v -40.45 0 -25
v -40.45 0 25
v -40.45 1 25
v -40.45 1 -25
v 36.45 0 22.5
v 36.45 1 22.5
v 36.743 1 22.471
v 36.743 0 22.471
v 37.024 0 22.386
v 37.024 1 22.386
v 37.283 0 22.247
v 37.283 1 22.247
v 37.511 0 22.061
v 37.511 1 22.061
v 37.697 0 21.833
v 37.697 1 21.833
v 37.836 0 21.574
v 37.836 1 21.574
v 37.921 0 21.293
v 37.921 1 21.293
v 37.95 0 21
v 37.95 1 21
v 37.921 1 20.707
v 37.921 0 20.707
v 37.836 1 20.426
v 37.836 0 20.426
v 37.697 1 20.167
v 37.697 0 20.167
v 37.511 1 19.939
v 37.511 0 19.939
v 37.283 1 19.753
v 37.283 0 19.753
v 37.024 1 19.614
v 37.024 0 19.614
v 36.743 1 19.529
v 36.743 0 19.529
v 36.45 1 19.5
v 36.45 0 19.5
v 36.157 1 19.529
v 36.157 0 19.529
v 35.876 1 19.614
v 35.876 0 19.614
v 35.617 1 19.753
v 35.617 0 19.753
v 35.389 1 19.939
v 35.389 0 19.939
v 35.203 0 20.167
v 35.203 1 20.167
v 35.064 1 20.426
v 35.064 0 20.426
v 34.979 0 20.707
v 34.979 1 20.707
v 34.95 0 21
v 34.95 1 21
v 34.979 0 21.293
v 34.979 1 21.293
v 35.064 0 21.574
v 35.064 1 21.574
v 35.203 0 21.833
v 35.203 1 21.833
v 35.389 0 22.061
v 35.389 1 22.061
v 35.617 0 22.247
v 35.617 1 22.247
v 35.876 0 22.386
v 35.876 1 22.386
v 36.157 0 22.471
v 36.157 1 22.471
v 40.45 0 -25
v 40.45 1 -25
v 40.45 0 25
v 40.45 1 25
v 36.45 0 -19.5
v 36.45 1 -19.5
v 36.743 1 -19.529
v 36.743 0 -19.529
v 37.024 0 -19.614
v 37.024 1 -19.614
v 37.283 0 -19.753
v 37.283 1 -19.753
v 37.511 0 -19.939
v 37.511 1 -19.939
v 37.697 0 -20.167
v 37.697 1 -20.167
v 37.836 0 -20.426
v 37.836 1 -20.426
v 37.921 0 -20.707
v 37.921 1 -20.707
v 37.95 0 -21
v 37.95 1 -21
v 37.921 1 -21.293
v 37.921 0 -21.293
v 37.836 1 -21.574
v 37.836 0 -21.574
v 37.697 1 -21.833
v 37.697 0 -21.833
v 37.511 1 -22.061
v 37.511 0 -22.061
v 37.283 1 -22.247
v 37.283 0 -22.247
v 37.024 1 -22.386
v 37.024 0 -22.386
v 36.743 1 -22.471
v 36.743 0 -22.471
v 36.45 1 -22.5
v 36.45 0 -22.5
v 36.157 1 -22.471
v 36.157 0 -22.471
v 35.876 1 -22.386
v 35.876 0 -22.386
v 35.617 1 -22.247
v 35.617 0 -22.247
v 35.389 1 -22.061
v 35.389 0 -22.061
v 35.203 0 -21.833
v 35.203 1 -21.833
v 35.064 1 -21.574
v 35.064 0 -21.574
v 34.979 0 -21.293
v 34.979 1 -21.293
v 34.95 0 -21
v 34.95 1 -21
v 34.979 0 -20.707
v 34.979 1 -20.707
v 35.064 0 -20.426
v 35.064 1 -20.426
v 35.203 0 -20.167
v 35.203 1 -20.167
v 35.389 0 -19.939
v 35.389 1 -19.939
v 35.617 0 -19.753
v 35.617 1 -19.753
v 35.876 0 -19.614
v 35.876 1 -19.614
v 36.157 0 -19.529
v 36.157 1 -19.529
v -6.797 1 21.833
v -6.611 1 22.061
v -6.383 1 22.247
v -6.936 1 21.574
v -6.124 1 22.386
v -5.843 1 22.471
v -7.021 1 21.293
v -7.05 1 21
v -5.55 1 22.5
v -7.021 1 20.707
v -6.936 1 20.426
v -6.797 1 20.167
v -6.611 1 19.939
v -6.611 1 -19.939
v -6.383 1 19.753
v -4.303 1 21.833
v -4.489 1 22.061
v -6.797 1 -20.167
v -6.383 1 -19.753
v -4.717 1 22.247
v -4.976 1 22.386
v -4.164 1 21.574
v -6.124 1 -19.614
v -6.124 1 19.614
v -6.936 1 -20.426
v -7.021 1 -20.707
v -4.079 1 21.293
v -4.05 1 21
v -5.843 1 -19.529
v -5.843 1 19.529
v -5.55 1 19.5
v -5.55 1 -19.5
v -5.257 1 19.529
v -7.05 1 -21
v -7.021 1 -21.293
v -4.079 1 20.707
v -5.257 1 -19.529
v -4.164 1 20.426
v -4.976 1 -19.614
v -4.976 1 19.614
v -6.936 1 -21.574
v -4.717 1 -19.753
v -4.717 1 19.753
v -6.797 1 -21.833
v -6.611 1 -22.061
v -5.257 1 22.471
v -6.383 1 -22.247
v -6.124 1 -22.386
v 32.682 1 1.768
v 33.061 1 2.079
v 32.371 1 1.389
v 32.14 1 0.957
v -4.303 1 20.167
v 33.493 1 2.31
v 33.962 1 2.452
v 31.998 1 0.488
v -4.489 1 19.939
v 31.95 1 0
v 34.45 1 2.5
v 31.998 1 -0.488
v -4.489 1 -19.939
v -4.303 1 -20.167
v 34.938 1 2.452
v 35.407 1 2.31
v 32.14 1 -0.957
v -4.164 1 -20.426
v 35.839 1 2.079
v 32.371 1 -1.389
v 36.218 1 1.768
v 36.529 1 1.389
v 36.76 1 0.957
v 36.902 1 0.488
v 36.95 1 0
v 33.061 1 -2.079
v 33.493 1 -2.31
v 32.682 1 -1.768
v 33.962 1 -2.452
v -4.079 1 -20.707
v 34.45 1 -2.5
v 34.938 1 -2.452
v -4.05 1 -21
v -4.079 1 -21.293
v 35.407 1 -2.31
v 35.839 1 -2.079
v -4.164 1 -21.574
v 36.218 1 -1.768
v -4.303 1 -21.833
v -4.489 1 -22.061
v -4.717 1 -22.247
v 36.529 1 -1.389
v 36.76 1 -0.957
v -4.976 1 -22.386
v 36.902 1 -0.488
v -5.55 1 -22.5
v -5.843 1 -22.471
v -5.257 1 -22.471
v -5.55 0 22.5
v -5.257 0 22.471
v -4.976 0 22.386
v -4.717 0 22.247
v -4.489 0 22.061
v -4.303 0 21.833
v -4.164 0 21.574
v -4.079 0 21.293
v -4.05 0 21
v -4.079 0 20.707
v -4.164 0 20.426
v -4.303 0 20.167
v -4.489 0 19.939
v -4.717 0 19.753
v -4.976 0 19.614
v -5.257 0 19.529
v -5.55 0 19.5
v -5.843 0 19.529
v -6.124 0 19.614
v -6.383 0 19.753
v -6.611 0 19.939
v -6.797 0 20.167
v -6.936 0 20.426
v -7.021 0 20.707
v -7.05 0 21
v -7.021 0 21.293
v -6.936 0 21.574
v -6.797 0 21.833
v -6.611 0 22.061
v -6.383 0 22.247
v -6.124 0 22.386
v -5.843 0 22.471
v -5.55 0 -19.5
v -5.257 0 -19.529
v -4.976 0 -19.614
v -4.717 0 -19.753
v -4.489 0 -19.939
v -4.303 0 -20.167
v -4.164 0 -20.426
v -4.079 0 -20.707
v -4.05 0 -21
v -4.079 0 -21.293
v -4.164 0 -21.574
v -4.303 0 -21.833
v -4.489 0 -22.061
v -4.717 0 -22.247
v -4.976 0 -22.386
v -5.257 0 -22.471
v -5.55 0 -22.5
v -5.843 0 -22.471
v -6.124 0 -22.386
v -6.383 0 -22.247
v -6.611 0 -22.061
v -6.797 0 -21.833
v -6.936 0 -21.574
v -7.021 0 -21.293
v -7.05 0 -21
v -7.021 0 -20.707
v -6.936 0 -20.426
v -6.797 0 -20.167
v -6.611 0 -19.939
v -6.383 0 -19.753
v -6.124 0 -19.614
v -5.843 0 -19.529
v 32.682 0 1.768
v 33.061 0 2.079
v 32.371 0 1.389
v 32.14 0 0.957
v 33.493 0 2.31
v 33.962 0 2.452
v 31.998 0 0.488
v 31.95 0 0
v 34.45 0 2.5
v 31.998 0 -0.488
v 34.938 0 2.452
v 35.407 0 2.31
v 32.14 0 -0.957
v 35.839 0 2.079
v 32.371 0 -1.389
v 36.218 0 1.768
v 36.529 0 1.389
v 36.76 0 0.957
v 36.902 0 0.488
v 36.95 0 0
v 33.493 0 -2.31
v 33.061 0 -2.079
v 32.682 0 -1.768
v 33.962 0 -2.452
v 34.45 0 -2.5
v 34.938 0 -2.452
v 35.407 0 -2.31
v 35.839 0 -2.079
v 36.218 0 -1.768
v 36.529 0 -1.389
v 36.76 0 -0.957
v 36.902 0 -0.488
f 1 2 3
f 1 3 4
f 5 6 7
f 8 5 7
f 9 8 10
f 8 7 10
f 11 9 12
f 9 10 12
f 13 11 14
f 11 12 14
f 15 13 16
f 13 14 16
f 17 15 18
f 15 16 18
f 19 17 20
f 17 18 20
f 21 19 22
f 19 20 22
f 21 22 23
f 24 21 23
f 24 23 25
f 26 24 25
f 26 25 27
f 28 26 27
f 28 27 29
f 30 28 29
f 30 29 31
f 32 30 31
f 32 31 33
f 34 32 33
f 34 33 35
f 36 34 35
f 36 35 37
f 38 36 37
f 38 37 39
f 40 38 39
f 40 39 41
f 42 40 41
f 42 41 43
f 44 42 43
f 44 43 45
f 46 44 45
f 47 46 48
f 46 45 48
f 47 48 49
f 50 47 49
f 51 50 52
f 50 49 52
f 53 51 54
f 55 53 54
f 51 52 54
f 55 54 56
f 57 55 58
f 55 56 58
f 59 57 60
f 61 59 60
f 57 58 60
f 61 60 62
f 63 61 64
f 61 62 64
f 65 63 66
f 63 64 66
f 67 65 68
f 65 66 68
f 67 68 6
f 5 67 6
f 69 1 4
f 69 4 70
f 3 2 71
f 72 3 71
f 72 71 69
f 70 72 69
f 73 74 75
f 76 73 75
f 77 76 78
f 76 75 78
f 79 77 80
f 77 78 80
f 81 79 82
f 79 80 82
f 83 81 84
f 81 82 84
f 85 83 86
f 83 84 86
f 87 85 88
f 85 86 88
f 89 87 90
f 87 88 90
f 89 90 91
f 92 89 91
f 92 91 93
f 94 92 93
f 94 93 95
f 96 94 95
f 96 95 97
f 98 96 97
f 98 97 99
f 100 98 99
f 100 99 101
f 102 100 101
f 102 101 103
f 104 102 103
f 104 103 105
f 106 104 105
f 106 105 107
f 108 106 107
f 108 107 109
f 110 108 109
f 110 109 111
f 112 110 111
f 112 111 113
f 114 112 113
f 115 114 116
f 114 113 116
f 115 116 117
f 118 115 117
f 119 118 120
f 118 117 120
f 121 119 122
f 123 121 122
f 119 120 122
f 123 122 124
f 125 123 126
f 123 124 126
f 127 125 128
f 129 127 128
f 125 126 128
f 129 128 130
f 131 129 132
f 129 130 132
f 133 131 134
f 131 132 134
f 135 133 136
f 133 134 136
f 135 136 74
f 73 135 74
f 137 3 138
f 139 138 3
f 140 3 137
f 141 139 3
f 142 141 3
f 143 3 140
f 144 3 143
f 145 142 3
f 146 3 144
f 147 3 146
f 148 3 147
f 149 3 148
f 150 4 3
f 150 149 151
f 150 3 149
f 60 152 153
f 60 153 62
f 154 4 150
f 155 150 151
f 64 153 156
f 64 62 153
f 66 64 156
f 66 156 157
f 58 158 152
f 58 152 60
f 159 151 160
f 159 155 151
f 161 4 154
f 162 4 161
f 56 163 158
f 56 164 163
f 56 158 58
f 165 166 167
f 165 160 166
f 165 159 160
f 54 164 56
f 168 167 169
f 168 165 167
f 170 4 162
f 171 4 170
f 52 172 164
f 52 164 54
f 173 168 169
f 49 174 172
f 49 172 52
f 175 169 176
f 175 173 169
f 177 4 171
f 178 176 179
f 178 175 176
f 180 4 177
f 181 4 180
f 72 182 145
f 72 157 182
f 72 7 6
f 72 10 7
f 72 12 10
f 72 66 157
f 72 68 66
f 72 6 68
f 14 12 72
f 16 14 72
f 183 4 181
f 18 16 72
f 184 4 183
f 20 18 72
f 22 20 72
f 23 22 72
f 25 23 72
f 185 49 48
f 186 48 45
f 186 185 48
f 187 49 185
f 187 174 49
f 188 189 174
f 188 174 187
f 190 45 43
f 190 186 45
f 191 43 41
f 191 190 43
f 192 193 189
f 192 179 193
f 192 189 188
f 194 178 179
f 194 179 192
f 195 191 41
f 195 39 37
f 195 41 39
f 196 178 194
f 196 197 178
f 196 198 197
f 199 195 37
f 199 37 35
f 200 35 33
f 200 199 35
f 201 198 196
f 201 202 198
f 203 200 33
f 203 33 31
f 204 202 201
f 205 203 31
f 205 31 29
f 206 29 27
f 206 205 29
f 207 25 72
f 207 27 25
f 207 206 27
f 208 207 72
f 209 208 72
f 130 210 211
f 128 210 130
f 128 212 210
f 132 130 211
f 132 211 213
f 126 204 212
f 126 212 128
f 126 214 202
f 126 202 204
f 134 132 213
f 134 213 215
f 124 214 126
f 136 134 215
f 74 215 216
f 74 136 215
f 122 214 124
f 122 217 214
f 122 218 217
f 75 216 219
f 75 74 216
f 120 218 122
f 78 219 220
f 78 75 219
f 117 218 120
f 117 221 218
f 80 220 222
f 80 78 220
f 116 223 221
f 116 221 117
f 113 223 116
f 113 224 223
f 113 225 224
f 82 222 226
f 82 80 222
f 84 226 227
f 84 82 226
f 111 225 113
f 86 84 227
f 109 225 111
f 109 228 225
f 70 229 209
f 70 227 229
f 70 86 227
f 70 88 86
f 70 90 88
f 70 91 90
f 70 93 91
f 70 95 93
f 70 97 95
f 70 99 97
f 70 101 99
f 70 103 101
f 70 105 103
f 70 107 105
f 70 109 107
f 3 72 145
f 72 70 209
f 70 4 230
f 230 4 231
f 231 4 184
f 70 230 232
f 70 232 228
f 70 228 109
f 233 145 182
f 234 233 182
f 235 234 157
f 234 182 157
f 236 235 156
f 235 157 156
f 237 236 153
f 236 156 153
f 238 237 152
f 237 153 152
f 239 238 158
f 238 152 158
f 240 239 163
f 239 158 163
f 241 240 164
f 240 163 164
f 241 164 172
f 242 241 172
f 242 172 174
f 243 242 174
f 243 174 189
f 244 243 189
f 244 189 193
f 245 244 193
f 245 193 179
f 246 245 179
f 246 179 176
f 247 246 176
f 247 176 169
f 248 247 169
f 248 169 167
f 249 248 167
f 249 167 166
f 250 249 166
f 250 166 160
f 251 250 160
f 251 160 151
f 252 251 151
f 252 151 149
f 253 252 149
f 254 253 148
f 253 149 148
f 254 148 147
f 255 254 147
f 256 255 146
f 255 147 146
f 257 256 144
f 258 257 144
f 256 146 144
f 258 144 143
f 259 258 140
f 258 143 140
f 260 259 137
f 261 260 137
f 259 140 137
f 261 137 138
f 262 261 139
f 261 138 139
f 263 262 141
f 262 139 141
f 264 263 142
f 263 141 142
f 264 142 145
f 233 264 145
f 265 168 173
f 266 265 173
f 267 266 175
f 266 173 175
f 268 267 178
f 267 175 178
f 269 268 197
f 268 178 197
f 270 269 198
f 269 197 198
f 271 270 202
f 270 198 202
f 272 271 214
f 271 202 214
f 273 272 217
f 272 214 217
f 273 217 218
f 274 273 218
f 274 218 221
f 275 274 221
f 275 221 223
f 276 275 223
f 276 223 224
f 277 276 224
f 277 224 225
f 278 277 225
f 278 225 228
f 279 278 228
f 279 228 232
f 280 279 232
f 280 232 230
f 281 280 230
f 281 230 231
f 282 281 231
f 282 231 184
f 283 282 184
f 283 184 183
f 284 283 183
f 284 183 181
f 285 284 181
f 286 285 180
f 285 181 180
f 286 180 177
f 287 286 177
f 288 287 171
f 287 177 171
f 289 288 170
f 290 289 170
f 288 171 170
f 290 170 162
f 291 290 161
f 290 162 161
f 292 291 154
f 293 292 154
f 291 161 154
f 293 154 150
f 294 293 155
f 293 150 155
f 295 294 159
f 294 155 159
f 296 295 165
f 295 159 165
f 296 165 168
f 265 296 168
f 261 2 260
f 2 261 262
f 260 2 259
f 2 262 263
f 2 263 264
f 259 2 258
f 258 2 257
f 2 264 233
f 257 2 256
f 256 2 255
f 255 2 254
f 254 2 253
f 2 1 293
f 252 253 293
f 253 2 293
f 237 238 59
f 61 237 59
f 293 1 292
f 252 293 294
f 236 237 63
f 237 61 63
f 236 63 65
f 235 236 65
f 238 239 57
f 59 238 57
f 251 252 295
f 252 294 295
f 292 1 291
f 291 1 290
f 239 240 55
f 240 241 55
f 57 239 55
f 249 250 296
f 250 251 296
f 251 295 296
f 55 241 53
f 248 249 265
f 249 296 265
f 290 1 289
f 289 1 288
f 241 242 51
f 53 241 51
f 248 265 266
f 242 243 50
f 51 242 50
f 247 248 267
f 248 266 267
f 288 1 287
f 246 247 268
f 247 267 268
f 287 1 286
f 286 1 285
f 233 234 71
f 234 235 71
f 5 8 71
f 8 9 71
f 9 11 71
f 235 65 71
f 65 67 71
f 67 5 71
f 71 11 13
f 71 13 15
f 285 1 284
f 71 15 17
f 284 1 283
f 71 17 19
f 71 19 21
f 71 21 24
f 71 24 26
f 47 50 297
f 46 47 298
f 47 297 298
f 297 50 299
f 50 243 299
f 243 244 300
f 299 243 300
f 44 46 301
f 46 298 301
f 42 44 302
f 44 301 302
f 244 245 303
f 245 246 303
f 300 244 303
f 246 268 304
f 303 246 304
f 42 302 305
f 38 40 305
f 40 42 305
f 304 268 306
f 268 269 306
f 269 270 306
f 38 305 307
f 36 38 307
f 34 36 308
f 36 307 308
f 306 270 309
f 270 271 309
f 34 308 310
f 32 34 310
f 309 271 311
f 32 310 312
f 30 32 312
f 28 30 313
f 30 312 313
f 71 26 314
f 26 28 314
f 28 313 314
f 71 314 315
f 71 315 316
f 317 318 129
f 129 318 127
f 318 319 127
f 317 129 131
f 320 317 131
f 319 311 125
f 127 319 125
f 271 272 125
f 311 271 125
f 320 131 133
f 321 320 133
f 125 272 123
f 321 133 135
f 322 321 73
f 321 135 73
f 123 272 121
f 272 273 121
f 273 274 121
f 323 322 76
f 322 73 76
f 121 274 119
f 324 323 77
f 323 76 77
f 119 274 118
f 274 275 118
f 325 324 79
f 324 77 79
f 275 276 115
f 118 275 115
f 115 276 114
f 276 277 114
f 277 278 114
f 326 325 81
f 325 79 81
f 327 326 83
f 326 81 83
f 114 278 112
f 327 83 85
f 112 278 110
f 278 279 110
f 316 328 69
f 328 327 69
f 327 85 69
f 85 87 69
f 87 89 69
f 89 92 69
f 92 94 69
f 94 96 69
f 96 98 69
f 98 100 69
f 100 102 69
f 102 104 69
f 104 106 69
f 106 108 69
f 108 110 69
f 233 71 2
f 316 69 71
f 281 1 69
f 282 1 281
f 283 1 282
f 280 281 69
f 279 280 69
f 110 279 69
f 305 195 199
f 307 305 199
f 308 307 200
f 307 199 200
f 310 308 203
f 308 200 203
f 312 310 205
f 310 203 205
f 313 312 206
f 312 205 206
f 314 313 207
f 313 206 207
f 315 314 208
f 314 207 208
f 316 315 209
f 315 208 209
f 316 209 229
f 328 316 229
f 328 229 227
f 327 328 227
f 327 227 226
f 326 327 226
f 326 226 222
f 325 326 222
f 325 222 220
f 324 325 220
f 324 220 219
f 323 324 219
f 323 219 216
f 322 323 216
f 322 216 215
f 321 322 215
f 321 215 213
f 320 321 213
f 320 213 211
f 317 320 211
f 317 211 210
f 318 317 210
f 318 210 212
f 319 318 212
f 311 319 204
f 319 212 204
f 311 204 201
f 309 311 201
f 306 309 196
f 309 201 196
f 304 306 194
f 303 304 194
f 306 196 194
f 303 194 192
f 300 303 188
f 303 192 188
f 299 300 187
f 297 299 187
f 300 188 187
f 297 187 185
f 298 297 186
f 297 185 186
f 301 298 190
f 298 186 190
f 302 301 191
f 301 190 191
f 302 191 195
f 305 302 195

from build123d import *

# Parameters (mm, degrees)
ESBO_O1_W                = 80.9
ESBO_O1_H                = 50
RESSALTO_EXTRUS_O1_DEPTH = 1
ESBO_O2_R                = 1.5
ESBO_O2_R_2              = 2.5
CORTE_EXTRUS_O1_DEPTH    = 48.562616623


with BuildPart() as part:
    # Esboço1 → Ressalto-extrusão1 (new body)
    with BuildSketch(Plane(origin=(0, 0, 0), x_dir=(1, 0, 0), z_dir=(0, 1, 0))):
        Rectangle(ESBO_O1_W, ESBO_O1_H)
    extrude(amount=RESSALTO_EXTRUS_O1_DEPTH)

    # Esboço2 → Corte-extrusão1 (cut, through all)
    with BuildSketch(Plane(origin=(0, 1, 0), x_dir=(1, 0, 0), z_dir=(0, 1, 0))):
        with Locations(Location((36.45, 21, 0), (0, 0, 270))):
            Circle(ESBO_O2_R)
        with Locations(Location((36.45, -21, 0), (0, 0, 270))):
            Circle(ESBO_O2_R)
        with Locations(Location((-5.55, -21, 0), (0, 0, 270))):
            Circle(ESBO_O2_R)
        with Locations(Location((-5.55, 21, 0), (0, 0, 270))):
            Circle(ESBO_O2_R)
        with Locations(Location((34.45, 0, 0), (0, 0, 270))):
            Circle(ESBO_O2_R_2)
    extrude(amount=-CORTE_EXTRUS_O1_DEPTH, mode=Mode.SUBTRACT)


solid = part.part
